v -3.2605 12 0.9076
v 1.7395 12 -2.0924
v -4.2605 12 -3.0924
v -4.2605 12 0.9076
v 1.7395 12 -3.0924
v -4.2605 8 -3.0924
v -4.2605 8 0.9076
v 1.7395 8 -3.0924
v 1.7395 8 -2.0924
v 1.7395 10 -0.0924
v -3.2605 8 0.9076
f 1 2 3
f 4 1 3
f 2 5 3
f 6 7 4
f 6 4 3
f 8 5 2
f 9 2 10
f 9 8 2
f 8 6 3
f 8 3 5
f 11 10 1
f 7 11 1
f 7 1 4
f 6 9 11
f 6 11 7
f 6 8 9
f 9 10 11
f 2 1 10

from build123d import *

# Parameters (mm, degrees)
EXTRUDE_1_DEPTH     = 20
SKETCH_4_W          = 39.68109217
SKETCH_4_H          = 19.592945183
CUT_EXTRUDE_1_DEPTH = 20
SKETCH_7_W          = 132.193091595
SKETCH_7_H          = 30.201739996
CUT_EXTRUDE_2_DEPTH = 20
SCALE_1_SCALE       = 0.2


with BuildPart() as part:
    # 草圖1 → 填料-伸長1 (new body)
    with BuildSketch(Plane(origin=(0, 0, 0), x_dir=(1, 0, 0), z_dir=(0, 1, 0))):
        Polygon((15, -5), (-10, -10), (-15, -10), (-15, 10), (15, 10), align=None)
    extrude(amount=EXTRUDE_1_DEPTH)

    # 草圖4 → 除料-伸長1 (cut)
    with BuildSketch(Plane(origin=(6.101694915, 10.169491525, 10.169491525), x_dir=(0.920574618, -0.276172385, -0.276172385), z_dir=(0.390566733, 0.650944555, 0.650944555))):
        with Locations((1.579314275, 10.72678571)):
            Rectangle(SKETCH_4_W, SKETCH_4_H)
    extrude(amount=CUT_EXTRUDE_1_DEPTH, mode=Mode.SUBTRACT)

    # 草圖7 → 除料-伸長2 (cut)
    with BuildSketch(Plane(origin=(1.016949153, -1.694915254, 1.694915254), x_dir=(-0.920574618, -0.276172385, 0.276172385), z_dir=(-0.390566733, 0.650944555, -0.650944555))):
        with Locations((9.754035329, 10.9182289)):
            Rectangle(SKETCH_7_W, SKETCH_7_H)
    extrude(amount=-CUT_EXTRUDE_2_DEPTH, mode=Mode.SUBTRACT)


with BuildPart() as part_1:
    # 縮放比例1: scaled about (-1.575630252, 10, -1.365546218)
    add(part.part.scale(SCALE_1_SCALE).moved(Location((-1.260504202, 8, -1.092436974))))


solid = part_1.part
